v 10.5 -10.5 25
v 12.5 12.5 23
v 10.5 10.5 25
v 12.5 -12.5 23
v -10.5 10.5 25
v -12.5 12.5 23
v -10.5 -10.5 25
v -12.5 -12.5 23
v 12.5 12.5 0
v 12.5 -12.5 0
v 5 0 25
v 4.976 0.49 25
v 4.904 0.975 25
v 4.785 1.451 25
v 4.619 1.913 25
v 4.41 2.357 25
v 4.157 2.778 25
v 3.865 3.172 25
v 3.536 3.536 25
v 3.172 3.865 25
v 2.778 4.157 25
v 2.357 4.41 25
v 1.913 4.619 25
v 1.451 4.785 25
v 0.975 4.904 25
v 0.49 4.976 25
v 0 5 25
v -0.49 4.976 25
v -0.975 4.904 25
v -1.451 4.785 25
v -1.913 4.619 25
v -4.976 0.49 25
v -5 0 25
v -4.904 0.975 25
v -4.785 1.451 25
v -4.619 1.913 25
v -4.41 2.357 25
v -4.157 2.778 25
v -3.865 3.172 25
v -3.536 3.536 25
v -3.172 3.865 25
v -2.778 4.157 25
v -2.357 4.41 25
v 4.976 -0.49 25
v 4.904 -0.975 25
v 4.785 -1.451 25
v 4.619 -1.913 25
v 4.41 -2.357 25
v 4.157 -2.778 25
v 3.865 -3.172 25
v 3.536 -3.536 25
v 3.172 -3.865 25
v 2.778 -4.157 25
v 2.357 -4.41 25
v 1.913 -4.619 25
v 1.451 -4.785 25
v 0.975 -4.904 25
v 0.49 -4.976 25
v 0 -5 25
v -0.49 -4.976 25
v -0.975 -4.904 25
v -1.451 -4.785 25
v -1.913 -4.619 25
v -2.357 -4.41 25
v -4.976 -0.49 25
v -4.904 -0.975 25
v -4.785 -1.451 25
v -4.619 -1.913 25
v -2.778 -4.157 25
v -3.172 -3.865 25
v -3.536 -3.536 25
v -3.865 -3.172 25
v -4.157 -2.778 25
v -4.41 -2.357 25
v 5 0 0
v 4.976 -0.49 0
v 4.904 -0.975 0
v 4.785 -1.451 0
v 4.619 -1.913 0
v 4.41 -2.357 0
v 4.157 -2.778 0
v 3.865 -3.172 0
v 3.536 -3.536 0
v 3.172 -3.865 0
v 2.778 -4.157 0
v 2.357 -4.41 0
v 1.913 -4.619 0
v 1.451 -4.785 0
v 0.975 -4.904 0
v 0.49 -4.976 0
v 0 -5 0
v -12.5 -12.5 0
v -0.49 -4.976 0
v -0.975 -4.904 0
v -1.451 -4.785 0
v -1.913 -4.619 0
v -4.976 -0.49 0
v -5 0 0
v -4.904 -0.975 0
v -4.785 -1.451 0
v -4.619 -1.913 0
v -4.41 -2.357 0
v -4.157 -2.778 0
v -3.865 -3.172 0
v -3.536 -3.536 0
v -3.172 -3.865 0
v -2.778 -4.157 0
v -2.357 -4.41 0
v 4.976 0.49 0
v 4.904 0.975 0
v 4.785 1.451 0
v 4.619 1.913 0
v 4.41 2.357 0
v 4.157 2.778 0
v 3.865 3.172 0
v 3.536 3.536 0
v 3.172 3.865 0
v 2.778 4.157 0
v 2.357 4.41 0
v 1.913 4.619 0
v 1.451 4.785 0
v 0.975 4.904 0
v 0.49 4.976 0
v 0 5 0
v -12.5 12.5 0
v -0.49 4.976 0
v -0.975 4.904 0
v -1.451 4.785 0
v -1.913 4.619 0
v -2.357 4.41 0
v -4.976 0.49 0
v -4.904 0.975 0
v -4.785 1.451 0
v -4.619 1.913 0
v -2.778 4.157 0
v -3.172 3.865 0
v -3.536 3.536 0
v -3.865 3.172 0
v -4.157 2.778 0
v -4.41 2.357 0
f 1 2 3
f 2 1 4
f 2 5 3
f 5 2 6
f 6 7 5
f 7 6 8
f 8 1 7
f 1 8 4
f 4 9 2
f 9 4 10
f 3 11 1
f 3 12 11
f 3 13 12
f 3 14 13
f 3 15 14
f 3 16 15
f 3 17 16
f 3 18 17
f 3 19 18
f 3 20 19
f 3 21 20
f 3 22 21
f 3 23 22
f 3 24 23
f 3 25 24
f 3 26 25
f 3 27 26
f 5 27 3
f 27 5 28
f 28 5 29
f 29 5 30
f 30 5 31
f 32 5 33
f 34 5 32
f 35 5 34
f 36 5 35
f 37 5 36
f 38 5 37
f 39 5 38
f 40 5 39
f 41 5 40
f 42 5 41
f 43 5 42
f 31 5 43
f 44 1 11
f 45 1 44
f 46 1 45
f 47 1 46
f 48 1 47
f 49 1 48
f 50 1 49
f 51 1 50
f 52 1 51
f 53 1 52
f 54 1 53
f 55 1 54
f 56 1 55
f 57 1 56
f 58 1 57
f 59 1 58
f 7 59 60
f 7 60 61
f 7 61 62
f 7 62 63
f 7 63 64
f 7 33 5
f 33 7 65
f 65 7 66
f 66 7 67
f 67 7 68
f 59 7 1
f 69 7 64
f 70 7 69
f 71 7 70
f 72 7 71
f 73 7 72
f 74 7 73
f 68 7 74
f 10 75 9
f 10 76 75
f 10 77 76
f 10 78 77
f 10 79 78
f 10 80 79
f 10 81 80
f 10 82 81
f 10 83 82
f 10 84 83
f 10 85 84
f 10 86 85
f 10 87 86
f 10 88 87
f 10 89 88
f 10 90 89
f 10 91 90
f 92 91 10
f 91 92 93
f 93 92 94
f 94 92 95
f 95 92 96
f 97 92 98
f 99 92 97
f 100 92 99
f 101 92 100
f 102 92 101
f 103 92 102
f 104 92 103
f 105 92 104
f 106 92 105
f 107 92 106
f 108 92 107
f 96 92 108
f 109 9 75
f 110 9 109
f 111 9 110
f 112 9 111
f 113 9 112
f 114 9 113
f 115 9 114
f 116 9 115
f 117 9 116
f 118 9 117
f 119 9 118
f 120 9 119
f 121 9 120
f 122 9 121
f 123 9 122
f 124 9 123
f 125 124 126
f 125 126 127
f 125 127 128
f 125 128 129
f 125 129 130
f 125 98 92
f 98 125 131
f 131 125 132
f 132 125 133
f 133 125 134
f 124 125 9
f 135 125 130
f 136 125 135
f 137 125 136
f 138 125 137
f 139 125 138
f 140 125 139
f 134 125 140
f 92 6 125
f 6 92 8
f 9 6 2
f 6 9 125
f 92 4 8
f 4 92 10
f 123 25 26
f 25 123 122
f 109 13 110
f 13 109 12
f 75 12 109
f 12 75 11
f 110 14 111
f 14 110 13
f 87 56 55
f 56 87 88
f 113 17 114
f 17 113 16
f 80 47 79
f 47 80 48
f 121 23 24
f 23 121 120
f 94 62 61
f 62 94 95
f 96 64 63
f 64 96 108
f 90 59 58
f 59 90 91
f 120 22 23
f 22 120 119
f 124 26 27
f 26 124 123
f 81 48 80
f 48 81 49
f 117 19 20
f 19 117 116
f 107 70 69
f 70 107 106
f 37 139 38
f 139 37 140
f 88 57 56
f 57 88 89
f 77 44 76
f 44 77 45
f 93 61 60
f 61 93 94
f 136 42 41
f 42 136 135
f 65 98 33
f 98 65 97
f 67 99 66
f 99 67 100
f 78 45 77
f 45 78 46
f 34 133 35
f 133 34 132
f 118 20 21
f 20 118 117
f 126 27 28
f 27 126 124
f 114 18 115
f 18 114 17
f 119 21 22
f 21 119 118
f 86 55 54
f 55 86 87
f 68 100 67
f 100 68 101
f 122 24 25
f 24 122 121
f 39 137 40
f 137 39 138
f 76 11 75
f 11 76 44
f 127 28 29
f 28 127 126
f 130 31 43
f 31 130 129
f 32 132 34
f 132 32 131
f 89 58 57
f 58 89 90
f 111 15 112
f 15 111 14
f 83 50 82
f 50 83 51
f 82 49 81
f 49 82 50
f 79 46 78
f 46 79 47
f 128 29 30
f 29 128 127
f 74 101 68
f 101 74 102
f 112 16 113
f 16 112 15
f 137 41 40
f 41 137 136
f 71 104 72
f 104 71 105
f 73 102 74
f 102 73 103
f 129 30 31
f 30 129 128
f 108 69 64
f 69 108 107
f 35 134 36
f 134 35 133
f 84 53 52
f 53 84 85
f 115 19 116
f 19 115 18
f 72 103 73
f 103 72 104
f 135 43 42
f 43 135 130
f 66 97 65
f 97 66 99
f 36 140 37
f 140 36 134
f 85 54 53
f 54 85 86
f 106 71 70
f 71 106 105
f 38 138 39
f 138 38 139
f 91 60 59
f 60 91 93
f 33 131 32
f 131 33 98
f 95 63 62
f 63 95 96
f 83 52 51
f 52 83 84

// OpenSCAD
// Gold reference: T1 cube iterated — 10mm hole, 2mm chamfer on the four top edges.
$fn = 64;

size = 25;
hole_d = 10;
chamfer = 2;

difference() {
  translate([-size / 2, -size / 2, 0]) cube([size, size, size]);
  translate([0, 0, -1]) cylinder(d = hole_d, h = size + 2);
  // 45° chamfer cutters along each top edge: a square prism (side chamfer*sqrt(2))
  // rotated 45° about the edge axis leaves a 2mm-leg triangle cut
  for (a = [0, 90, 180, 270]) rotate([0, 0, a])
    translate([size / 2, 0, size]) rotate([0, 45, 0])
      cube([chamfer * sqrt(2), size + 2, chamfer * sqrt(2)], center = true);
}
